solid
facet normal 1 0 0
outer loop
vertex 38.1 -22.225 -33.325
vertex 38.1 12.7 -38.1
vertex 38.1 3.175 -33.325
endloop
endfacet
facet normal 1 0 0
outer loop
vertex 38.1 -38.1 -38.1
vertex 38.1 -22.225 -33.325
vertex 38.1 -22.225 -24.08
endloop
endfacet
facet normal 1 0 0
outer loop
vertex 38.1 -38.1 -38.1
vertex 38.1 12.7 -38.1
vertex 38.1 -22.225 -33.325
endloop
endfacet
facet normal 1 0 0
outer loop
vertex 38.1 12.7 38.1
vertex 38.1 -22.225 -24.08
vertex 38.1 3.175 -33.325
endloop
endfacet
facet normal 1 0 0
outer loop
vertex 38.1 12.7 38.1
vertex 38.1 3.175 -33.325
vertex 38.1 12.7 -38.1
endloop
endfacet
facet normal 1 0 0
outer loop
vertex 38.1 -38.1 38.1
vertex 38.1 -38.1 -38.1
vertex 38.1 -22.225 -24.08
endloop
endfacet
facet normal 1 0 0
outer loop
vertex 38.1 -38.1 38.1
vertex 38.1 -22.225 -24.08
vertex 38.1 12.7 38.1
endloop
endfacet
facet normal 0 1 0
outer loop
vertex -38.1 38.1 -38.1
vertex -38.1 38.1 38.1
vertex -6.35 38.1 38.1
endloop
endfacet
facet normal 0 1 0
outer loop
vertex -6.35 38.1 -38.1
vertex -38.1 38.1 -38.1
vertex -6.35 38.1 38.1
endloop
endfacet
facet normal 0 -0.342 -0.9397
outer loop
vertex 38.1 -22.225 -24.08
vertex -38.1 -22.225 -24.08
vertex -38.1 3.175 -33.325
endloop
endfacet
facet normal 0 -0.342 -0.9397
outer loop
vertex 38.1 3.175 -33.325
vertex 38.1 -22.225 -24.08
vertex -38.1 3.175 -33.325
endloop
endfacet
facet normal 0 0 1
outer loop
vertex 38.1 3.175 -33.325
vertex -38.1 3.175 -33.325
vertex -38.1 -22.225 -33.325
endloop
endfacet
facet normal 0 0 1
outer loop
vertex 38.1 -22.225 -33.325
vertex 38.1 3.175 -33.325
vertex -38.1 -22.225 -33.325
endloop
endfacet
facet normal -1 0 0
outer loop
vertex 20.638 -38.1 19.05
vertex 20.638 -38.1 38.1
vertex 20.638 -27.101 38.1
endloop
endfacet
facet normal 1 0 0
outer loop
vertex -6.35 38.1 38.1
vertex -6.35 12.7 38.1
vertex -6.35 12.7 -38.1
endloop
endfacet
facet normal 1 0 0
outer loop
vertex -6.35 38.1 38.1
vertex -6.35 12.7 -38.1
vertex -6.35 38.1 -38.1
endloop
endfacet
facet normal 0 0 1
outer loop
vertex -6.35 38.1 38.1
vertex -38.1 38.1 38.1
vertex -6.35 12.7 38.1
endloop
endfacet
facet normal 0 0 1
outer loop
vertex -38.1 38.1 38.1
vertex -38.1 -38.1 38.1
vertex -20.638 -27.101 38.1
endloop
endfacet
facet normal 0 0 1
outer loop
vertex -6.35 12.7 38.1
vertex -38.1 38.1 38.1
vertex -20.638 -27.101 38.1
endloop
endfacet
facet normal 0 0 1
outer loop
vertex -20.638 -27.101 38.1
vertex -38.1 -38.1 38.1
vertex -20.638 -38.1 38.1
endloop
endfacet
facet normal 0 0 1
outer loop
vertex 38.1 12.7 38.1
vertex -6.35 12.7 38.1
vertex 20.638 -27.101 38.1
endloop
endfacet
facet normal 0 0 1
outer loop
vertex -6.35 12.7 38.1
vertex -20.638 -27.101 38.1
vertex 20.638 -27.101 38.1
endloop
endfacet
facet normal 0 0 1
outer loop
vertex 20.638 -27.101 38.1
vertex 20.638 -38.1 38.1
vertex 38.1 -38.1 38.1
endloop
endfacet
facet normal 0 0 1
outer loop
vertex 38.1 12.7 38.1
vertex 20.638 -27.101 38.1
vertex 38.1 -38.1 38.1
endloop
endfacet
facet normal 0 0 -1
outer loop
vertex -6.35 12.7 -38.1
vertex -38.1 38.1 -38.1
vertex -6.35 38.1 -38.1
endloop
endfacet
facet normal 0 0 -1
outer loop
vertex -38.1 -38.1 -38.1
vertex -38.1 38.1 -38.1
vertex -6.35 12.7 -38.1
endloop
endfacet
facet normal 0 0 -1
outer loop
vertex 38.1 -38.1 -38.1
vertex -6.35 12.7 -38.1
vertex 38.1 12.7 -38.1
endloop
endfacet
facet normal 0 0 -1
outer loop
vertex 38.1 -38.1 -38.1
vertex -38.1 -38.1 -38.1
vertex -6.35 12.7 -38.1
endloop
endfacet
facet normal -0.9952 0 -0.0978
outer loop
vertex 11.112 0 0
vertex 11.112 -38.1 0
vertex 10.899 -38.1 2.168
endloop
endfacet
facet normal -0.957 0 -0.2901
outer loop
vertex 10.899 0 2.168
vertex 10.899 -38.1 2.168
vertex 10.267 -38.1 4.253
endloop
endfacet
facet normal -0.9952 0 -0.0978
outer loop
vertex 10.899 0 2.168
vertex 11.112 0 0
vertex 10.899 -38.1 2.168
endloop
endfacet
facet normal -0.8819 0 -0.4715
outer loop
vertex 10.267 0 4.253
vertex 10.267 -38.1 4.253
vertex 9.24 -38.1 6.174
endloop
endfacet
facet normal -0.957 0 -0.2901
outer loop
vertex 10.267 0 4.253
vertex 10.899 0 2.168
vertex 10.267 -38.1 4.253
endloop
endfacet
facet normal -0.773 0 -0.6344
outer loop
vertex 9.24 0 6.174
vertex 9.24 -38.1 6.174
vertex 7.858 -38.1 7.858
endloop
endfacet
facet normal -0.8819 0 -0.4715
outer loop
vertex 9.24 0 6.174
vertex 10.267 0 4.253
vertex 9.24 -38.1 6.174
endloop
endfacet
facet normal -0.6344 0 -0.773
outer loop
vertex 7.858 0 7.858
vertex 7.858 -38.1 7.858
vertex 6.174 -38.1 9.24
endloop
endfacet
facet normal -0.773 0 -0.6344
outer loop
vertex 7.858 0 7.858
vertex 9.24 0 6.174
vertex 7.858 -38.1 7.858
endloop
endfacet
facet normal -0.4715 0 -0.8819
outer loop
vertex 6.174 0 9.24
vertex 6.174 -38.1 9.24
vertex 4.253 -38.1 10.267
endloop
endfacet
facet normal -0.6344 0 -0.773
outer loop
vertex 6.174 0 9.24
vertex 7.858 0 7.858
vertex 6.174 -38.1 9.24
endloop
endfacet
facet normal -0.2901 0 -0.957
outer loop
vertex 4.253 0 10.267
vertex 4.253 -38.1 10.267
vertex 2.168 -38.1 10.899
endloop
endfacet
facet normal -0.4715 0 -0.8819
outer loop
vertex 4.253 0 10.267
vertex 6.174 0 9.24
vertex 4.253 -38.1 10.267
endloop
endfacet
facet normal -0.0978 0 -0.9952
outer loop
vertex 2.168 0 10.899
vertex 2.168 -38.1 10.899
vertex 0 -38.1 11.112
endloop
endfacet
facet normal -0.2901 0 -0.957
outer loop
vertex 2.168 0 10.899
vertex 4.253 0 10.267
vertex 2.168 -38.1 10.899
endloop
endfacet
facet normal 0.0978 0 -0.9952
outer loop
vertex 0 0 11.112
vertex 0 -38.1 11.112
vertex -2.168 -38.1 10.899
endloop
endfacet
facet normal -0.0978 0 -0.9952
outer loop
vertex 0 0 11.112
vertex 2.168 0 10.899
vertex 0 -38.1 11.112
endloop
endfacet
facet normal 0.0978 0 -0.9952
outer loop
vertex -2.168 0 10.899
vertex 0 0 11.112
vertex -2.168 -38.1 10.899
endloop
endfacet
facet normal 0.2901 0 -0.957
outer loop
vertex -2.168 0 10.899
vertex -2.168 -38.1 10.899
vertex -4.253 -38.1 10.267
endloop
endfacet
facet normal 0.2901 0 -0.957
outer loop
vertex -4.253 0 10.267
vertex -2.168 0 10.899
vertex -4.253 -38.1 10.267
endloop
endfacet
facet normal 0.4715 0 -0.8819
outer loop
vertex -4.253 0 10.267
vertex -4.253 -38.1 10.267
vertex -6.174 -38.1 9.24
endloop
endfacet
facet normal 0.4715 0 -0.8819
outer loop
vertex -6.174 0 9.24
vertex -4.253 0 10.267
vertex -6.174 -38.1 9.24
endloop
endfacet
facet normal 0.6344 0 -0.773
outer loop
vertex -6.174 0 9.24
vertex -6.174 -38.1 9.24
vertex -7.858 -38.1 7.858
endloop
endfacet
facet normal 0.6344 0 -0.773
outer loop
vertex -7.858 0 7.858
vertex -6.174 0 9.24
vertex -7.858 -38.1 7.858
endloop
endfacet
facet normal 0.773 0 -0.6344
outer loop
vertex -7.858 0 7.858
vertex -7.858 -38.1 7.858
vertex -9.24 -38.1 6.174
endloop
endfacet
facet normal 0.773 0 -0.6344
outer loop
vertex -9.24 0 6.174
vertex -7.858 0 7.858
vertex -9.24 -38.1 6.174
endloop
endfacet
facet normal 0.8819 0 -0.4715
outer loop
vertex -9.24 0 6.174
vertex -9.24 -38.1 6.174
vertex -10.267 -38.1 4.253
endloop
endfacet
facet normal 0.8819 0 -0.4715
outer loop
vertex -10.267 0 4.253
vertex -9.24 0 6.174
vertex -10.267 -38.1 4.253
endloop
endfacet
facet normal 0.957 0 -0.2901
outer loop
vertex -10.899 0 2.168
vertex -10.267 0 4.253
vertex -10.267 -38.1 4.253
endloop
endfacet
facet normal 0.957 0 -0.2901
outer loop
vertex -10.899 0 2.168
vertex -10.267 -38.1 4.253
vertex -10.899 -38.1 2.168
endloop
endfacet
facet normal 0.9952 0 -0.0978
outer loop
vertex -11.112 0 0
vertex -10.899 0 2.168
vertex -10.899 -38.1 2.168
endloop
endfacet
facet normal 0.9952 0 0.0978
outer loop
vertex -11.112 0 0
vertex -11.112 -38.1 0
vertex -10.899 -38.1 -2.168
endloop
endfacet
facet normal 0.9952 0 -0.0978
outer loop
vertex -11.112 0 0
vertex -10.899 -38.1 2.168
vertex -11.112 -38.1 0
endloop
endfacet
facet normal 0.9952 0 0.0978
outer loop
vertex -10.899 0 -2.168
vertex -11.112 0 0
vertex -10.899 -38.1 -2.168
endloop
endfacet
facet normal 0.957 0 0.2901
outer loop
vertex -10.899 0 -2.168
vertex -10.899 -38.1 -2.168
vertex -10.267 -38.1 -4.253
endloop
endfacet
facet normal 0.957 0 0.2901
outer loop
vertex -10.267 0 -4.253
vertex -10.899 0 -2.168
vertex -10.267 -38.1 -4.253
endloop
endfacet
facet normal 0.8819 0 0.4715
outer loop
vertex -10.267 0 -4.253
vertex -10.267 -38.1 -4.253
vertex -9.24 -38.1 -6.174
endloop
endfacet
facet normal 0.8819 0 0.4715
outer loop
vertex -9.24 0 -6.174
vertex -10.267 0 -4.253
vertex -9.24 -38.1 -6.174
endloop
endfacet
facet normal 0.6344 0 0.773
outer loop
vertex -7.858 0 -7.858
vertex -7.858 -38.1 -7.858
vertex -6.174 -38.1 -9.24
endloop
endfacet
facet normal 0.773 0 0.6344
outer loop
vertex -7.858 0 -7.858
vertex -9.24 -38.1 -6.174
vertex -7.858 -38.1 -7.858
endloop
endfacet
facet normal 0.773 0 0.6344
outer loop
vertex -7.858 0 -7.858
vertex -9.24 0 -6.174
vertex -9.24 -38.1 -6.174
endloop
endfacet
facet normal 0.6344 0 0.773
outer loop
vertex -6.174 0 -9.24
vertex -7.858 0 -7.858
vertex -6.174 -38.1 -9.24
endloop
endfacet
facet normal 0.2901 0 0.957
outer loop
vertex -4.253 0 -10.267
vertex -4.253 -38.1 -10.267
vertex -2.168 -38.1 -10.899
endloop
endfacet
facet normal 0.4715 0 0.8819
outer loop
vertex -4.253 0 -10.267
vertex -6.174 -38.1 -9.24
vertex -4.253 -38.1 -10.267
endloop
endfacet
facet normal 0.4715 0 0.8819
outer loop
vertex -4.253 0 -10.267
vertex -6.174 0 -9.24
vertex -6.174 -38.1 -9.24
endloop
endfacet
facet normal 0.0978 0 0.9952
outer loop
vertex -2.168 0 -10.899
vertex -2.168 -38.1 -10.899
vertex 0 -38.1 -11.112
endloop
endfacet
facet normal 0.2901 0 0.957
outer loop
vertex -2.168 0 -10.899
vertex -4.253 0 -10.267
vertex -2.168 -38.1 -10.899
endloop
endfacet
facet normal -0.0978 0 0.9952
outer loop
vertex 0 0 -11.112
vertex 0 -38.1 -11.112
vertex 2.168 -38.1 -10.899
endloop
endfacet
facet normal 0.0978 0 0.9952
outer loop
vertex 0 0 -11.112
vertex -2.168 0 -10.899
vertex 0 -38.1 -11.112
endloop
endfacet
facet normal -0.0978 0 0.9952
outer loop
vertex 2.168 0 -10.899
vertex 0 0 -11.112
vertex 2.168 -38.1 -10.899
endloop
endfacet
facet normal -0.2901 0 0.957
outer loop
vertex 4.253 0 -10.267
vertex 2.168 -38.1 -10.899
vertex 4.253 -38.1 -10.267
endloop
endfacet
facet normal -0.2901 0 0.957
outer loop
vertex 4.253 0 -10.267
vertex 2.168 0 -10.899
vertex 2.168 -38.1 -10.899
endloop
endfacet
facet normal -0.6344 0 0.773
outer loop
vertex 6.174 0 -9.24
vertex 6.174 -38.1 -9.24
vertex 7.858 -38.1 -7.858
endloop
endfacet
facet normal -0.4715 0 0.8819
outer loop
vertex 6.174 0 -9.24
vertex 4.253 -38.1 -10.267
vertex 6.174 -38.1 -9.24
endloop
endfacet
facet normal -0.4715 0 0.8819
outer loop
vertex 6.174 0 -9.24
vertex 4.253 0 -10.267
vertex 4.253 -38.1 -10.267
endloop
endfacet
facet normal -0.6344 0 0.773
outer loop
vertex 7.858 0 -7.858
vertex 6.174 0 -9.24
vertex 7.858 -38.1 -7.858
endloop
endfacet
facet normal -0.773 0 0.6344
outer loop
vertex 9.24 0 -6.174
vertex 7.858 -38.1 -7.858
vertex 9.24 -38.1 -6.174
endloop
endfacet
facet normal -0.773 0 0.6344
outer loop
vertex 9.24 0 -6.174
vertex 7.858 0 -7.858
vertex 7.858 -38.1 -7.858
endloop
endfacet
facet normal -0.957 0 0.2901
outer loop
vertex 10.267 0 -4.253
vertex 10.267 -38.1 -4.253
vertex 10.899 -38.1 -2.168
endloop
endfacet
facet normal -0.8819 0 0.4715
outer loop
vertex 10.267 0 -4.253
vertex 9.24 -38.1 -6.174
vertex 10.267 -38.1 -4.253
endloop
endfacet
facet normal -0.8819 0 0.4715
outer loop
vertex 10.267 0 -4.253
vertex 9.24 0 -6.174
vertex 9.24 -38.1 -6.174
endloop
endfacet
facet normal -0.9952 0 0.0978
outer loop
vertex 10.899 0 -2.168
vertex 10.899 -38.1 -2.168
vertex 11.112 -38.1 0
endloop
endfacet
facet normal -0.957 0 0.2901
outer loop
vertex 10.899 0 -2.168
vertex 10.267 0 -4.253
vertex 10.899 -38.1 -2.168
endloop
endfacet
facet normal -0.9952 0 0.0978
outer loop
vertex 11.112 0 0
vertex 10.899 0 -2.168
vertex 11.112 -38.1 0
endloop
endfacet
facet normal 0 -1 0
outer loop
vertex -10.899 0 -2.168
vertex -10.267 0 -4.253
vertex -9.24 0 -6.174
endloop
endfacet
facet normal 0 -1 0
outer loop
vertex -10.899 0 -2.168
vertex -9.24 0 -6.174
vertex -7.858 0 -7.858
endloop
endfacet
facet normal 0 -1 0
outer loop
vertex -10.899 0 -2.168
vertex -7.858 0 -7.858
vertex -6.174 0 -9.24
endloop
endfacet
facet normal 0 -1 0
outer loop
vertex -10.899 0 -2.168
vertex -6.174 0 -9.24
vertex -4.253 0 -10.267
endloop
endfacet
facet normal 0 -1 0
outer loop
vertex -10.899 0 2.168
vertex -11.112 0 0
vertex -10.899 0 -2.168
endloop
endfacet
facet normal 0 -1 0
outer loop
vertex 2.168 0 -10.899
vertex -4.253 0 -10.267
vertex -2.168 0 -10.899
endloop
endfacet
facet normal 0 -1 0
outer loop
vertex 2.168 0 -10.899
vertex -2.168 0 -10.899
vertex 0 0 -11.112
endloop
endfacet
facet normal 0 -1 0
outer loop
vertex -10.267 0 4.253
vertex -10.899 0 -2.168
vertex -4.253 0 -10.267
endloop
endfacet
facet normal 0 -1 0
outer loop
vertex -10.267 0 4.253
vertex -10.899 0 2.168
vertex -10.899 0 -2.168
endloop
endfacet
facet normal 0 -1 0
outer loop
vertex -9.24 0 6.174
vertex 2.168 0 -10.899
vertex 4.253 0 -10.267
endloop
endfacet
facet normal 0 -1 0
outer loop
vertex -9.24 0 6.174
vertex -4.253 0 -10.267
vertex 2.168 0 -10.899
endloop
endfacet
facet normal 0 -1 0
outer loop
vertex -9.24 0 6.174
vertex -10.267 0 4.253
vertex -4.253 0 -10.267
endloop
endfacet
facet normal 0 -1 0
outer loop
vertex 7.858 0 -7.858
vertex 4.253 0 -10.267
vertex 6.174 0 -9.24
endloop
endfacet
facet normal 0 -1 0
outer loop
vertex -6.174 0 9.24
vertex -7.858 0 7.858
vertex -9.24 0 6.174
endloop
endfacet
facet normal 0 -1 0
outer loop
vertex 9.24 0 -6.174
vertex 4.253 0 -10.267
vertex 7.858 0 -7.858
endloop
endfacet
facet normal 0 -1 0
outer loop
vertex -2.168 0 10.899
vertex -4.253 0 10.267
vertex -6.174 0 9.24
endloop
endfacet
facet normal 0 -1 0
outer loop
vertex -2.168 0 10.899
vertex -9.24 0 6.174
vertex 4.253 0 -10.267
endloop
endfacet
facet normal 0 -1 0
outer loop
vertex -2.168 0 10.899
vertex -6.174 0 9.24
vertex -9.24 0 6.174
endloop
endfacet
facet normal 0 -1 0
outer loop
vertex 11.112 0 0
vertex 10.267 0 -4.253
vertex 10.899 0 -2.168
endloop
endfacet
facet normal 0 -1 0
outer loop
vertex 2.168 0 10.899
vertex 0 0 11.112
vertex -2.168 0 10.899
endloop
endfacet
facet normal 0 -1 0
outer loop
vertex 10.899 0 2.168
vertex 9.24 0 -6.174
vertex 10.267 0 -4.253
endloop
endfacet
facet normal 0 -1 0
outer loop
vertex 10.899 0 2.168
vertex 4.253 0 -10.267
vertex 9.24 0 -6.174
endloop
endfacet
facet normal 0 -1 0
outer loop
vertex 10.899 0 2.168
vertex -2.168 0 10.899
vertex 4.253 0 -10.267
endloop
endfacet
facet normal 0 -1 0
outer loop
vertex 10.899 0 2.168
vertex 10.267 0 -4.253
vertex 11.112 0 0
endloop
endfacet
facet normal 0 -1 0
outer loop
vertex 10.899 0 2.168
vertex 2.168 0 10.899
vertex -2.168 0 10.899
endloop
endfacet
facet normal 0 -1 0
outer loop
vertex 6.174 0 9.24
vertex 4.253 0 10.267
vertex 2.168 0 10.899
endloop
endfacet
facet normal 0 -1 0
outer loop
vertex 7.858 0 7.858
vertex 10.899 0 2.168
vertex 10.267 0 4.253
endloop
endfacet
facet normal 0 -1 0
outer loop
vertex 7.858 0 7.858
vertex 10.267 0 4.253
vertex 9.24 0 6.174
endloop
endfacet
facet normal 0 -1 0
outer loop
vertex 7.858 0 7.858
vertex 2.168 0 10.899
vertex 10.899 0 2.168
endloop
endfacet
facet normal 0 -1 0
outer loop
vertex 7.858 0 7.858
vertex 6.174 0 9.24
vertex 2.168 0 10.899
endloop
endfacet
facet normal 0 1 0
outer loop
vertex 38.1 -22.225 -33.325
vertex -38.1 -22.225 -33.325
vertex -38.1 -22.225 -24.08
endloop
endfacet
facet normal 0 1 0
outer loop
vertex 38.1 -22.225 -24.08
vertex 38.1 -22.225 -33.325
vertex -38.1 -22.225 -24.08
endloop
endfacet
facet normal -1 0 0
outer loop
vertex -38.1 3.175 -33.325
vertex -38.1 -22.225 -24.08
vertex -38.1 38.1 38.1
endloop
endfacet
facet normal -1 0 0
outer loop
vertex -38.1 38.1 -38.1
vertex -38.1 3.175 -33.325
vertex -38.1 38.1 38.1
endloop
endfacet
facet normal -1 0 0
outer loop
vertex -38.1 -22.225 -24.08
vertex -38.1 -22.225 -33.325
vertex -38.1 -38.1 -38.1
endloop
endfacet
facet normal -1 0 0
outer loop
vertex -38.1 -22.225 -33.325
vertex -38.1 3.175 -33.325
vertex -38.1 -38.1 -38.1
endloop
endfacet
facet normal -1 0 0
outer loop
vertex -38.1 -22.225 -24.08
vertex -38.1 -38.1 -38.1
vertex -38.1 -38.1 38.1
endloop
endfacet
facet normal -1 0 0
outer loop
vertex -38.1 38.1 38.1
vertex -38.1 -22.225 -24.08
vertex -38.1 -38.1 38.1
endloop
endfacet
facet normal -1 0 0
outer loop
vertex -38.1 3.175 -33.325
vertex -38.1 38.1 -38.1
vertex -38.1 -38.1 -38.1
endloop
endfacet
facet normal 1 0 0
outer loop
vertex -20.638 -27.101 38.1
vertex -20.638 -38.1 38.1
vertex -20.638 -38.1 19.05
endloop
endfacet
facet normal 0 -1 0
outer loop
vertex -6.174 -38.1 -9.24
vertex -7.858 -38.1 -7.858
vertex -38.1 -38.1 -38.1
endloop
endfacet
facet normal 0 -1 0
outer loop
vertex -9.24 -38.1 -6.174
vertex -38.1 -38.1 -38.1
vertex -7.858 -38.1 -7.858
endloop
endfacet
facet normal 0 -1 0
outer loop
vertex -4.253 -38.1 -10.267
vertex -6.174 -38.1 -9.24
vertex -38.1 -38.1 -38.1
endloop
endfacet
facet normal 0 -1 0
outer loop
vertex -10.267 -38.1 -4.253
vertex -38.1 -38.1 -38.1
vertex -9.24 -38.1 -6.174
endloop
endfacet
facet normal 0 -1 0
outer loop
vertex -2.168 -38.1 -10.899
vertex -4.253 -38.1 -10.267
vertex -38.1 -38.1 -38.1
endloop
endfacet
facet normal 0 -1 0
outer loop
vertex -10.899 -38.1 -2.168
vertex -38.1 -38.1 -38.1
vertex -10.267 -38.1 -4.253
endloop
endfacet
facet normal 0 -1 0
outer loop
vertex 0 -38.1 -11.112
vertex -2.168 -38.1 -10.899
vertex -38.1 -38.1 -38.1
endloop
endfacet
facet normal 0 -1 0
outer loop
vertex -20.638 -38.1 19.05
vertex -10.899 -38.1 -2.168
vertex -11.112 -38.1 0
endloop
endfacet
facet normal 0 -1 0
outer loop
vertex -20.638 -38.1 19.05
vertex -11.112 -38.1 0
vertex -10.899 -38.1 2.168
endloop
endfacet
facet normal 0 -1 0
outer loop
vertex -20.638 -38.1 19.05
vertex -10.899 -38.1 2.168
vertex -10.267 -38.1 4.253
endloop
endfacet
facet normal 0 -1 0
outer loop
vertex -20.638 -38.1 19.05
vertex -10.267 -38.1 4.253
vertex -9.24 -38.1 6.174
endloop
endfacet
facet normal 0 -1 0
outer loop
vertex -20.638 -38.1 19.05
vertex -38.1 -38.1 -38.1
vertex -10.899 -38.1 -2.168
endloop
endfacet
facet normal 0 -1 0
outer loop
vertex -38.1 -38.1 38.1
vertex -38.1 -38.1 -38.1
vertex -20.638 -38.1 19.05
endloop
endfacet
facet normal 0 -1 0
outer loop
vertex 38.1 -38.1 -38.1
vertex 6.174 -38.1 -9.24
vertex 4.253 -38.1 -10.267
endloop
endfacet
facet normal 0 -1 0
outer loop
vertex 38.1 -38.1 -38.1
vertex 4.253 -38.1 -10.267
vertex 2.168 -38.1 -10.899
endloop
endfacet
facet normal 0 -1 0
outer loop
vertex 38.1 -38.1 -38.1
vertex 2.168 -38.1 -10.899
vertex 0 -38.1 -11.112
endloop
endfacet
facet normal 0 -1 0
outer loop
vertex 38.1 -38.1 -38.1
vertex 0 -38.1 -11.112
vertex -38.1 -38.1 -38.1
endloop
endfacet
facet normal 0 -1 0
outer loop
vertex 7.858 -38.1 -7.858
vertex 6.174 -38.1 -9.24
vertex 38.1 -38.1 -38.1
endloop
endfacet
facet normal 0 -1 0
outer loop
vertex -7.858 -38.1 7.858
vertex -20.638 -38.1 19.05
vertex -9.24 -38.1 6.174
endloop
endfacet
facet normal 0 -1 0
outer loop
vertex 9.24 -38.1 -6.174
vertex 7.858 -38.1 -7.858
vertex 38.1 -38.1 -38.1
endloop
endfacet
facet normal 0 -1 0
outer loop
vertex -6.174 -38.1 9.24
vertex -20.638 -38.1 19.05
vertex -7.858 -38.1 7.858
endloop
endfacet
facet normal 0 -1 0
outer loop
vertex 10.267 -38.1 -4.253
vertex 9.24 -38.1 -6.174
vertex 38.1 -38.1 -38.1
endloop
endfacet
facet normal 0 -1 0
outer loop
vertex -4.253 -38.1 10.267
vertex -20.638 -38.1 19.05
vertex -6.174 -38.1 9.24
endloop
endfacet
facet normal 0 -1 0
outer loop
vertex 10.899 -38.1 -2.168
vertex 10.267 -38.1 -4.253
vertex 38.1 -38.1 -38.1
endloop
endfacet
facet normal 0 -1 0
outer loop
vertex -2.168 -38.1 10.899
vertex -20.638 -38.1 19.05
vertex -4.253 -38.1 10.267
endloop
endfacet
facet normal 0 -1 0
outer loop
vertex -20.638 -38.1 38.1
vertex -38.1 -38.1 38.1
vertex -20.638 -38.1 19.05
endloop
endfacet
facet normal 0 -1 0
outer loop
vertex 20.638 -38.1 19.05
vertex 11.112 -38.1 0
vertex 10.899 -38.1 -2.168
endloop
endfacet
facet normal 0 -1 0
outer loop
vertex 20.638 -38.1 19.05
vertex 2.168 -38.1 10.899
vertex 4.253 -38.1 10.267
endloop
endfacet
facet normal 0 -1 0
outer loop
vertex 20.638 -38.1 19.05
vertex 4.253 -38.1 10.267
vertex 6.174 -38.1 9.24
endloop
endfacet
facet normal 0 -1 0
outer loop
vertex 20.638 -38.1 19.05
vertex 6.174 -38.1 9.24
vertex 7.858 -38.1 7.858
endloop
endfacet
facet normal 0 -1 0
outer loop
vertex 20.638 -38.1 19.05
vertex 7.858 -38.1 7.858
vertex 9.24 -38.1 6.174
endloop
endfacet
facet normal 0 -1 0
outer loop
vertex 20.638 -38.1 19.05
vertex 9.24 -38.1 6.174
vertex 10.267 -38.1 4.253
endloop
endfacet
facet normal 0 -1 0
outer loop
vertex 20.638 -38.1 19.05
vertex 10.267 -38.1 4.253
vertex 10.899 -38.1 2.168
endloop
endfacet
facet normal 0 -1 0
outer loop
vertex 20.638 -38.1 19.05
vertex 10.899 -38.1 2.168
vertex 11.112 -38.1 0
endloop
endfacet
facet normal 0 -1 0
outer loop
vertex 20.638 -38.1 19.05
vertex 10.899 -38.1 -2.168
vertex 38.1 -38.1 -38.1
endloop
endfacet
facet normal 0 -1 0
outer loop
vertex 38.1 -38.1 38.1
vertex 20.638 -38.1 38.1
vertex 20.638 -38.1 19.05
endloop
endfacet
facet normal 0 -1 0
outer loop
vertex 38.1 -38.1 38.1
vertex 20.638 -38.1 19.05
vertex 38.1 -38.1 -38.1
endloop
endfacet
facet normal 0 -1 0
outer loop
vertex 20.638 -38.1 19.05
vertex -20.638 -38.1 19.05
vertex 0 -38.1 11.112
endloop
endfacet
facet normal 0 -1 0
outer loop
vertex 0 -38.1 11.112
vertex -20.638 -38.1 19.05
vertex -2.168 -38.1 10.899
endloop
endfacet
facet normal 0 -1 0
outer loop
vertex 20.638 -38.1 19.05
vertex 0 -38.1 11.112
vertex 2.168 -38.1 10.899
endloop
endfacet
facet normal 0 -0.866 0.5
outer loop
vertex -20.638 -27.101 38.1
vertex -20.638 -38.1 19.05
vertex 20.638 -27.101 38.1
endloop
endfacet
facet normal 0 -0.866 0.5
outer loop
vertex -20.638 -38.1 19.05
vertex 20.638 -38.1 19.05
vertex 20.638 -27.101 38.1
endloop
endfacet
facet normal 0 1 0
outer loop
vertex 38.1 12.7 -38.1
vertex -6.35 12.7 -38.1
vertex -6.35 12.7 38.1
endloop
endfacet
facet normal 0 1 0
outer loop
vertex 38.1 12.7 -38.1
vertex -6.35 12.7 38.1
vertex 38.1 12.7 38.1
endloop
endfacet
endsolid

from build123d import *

# Parameters (mm, degrees)
F0_W     = 76.2
F0_H     = 76.2
F1_DEPTH = 38.1
F2_R     = 11.1125
F3_DEPTH = 38.101
F6_DEPTH = 20.6375
F4_W     = 44.45
F4_H     = 25.4
F7_DEPTH = 76.201
F9_DEPTH = 76.201


with BuildPart() as f1:
    # F0 (on Front) → F1 (new body, symmetric)
    with BuildSketch(Plane.XZ):
        Rectangle(F0_W, F0_H)
    extrude(amount=F1_DEPTH, both=True)

    # F2 (on Front) → F3 (cut, through all)
    with BuildSketch(Plane.XZ):
        Circle(F2_R)
    extrude(amount=F3_DEPTH, mode=Mode.SUBTRACT)

    # F5 (on Right) → F6 (cut, symmetric)
    with BuildSketch(Plane.YZ):
        Polygon((-38.1, 19.05), (-27.101477, 38.1), (-38.1, 38.1), align=None)
    extrude(amount=F6_DEPTH, both=True, mode=Mode.SUBTRACT)

    # F4 (on face) → F7 (cut, through all)
    with BuildSketch(Plane.XY.offset(38.1)):
        with Locations((15.875, 25.4)):
            Rectangle(F4_W, F4_H)
    extrude(amount=-F7_DEPTH, mode=Mode.SUBTRACT)

    # F8 (on face) → F9 (cut, through all)
    with BuildSketch(Plane(origin=(-38.1, 0, 0), x_dir=(0, -1, 0), z_dir=(-1, 0, 0))):
        Polygon((22.225, -24.079956), (-3.175, -33.3248), (22.225, -33.3248), align=None)
    extrude(amount=-F9_DEPTH, mode=Mode.SUBTRACT)


solid = f1.part
